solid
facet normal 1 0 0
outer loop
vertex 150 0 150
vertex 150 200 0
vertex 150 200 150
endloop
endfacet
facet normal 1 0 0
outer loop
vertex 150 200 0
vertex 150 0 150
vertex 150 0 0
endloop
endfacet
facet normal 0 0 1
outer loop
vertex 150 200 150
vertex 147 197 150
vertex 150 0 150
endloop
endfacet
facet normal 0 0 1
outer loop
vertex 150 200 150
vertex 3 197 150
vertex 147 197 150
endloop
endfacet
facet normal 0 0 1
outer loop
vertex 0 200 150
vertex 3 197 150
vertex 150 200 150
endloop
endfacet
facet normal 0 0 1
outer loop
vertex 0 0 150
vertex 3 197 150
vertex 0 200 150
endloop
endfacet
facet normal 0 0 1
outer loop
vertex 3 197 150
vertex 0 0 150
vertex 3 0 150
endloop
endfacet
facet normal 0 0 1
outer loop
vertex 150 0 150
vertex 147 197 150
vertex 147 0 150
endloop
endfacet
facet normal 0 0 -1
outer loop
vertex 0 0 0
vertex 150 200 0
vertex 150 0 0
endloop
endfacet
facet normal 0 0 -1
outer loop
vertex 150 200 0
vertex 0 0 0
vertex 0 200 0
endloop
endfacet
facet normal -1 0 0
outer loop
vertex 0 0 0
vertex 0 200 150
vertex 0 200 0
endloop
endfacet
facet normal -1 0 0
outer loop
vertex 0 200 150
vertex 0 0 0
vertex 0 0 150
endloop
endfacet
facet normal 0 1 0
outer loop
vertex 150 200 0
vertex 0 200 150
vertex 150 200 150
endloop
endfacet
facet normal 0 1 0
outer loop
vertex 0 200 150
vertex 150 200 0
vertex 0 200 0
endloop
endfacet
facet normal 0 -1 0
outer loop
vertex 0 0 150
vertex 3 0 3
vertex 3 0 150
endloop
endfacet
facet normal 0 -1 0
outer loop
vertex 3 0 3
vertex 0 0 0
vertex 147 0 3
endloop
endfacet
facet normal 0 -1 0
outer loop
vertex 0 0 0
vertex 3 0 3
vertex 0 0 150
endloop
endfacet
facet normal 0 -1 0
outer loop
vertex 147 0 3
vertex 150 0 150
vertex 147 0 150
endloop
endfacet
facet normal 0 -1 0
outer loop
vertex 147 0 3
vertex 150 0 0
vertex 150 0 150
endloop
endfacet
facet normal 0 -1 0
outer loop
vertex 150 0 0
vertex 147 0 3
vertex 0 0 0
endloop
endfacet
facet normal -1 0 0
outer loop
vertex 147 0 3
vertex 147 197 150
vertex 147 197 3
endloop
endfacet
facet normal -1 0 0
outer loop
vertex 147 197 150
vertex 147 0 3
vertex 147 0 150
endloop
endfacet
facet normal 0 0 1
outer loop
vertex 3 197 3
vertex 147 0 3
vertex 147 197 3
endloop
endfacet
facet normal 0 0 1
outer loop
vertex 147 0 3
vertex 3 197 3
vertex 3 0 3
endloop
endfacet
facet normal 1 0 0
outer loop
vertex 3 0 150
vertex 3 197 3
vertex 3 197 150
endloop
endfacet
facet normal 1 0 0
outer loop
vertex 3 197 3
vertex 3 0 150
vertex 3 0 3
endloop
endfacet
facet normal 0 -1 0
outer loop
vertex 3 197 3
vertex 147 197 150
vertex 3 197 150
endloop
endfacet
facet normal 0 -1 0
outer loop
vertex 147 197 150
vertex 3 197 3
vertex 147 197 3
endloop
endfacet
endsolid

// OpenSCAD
wall = 3;

box_x = 150;
box_y = 200;
box_z = 150;
hole_r = 5;

module holes(rx=-10, ry=10, rz=box_x, trz=hole_r) {
  translate([0, ry, trz])
    rotate([rx,0,0])
    hull() {
      sphere(r = hole_r);
      translate([0, 0, rz/5*3])
        sphere(r = hole_r);
    }
}

 
difference() {
  cube([box_x, box_y, box_z]);
  translate([wall, 0, wall])
    cube([box_x-wall*2, box_y-wall, box_z]);
  *for (i = [0 : 1 : 8])
    translate([0, i * 20, box_x/6])
      holes();

  *for (i = [0 : 1 : 9])
    translate([box_x, i * 20, box_x/6])
      holes();

  *for (i = [1 : 1 : 7])
    translate([i * 20-5, box_y, box_x/6])
      holes(0, 0);
  
  *for (i = [1 : 1 : 7])
    translate([i * 20-5, box_y/6*5, -5])
      holes(90, 0, box_y/4*5);
}
